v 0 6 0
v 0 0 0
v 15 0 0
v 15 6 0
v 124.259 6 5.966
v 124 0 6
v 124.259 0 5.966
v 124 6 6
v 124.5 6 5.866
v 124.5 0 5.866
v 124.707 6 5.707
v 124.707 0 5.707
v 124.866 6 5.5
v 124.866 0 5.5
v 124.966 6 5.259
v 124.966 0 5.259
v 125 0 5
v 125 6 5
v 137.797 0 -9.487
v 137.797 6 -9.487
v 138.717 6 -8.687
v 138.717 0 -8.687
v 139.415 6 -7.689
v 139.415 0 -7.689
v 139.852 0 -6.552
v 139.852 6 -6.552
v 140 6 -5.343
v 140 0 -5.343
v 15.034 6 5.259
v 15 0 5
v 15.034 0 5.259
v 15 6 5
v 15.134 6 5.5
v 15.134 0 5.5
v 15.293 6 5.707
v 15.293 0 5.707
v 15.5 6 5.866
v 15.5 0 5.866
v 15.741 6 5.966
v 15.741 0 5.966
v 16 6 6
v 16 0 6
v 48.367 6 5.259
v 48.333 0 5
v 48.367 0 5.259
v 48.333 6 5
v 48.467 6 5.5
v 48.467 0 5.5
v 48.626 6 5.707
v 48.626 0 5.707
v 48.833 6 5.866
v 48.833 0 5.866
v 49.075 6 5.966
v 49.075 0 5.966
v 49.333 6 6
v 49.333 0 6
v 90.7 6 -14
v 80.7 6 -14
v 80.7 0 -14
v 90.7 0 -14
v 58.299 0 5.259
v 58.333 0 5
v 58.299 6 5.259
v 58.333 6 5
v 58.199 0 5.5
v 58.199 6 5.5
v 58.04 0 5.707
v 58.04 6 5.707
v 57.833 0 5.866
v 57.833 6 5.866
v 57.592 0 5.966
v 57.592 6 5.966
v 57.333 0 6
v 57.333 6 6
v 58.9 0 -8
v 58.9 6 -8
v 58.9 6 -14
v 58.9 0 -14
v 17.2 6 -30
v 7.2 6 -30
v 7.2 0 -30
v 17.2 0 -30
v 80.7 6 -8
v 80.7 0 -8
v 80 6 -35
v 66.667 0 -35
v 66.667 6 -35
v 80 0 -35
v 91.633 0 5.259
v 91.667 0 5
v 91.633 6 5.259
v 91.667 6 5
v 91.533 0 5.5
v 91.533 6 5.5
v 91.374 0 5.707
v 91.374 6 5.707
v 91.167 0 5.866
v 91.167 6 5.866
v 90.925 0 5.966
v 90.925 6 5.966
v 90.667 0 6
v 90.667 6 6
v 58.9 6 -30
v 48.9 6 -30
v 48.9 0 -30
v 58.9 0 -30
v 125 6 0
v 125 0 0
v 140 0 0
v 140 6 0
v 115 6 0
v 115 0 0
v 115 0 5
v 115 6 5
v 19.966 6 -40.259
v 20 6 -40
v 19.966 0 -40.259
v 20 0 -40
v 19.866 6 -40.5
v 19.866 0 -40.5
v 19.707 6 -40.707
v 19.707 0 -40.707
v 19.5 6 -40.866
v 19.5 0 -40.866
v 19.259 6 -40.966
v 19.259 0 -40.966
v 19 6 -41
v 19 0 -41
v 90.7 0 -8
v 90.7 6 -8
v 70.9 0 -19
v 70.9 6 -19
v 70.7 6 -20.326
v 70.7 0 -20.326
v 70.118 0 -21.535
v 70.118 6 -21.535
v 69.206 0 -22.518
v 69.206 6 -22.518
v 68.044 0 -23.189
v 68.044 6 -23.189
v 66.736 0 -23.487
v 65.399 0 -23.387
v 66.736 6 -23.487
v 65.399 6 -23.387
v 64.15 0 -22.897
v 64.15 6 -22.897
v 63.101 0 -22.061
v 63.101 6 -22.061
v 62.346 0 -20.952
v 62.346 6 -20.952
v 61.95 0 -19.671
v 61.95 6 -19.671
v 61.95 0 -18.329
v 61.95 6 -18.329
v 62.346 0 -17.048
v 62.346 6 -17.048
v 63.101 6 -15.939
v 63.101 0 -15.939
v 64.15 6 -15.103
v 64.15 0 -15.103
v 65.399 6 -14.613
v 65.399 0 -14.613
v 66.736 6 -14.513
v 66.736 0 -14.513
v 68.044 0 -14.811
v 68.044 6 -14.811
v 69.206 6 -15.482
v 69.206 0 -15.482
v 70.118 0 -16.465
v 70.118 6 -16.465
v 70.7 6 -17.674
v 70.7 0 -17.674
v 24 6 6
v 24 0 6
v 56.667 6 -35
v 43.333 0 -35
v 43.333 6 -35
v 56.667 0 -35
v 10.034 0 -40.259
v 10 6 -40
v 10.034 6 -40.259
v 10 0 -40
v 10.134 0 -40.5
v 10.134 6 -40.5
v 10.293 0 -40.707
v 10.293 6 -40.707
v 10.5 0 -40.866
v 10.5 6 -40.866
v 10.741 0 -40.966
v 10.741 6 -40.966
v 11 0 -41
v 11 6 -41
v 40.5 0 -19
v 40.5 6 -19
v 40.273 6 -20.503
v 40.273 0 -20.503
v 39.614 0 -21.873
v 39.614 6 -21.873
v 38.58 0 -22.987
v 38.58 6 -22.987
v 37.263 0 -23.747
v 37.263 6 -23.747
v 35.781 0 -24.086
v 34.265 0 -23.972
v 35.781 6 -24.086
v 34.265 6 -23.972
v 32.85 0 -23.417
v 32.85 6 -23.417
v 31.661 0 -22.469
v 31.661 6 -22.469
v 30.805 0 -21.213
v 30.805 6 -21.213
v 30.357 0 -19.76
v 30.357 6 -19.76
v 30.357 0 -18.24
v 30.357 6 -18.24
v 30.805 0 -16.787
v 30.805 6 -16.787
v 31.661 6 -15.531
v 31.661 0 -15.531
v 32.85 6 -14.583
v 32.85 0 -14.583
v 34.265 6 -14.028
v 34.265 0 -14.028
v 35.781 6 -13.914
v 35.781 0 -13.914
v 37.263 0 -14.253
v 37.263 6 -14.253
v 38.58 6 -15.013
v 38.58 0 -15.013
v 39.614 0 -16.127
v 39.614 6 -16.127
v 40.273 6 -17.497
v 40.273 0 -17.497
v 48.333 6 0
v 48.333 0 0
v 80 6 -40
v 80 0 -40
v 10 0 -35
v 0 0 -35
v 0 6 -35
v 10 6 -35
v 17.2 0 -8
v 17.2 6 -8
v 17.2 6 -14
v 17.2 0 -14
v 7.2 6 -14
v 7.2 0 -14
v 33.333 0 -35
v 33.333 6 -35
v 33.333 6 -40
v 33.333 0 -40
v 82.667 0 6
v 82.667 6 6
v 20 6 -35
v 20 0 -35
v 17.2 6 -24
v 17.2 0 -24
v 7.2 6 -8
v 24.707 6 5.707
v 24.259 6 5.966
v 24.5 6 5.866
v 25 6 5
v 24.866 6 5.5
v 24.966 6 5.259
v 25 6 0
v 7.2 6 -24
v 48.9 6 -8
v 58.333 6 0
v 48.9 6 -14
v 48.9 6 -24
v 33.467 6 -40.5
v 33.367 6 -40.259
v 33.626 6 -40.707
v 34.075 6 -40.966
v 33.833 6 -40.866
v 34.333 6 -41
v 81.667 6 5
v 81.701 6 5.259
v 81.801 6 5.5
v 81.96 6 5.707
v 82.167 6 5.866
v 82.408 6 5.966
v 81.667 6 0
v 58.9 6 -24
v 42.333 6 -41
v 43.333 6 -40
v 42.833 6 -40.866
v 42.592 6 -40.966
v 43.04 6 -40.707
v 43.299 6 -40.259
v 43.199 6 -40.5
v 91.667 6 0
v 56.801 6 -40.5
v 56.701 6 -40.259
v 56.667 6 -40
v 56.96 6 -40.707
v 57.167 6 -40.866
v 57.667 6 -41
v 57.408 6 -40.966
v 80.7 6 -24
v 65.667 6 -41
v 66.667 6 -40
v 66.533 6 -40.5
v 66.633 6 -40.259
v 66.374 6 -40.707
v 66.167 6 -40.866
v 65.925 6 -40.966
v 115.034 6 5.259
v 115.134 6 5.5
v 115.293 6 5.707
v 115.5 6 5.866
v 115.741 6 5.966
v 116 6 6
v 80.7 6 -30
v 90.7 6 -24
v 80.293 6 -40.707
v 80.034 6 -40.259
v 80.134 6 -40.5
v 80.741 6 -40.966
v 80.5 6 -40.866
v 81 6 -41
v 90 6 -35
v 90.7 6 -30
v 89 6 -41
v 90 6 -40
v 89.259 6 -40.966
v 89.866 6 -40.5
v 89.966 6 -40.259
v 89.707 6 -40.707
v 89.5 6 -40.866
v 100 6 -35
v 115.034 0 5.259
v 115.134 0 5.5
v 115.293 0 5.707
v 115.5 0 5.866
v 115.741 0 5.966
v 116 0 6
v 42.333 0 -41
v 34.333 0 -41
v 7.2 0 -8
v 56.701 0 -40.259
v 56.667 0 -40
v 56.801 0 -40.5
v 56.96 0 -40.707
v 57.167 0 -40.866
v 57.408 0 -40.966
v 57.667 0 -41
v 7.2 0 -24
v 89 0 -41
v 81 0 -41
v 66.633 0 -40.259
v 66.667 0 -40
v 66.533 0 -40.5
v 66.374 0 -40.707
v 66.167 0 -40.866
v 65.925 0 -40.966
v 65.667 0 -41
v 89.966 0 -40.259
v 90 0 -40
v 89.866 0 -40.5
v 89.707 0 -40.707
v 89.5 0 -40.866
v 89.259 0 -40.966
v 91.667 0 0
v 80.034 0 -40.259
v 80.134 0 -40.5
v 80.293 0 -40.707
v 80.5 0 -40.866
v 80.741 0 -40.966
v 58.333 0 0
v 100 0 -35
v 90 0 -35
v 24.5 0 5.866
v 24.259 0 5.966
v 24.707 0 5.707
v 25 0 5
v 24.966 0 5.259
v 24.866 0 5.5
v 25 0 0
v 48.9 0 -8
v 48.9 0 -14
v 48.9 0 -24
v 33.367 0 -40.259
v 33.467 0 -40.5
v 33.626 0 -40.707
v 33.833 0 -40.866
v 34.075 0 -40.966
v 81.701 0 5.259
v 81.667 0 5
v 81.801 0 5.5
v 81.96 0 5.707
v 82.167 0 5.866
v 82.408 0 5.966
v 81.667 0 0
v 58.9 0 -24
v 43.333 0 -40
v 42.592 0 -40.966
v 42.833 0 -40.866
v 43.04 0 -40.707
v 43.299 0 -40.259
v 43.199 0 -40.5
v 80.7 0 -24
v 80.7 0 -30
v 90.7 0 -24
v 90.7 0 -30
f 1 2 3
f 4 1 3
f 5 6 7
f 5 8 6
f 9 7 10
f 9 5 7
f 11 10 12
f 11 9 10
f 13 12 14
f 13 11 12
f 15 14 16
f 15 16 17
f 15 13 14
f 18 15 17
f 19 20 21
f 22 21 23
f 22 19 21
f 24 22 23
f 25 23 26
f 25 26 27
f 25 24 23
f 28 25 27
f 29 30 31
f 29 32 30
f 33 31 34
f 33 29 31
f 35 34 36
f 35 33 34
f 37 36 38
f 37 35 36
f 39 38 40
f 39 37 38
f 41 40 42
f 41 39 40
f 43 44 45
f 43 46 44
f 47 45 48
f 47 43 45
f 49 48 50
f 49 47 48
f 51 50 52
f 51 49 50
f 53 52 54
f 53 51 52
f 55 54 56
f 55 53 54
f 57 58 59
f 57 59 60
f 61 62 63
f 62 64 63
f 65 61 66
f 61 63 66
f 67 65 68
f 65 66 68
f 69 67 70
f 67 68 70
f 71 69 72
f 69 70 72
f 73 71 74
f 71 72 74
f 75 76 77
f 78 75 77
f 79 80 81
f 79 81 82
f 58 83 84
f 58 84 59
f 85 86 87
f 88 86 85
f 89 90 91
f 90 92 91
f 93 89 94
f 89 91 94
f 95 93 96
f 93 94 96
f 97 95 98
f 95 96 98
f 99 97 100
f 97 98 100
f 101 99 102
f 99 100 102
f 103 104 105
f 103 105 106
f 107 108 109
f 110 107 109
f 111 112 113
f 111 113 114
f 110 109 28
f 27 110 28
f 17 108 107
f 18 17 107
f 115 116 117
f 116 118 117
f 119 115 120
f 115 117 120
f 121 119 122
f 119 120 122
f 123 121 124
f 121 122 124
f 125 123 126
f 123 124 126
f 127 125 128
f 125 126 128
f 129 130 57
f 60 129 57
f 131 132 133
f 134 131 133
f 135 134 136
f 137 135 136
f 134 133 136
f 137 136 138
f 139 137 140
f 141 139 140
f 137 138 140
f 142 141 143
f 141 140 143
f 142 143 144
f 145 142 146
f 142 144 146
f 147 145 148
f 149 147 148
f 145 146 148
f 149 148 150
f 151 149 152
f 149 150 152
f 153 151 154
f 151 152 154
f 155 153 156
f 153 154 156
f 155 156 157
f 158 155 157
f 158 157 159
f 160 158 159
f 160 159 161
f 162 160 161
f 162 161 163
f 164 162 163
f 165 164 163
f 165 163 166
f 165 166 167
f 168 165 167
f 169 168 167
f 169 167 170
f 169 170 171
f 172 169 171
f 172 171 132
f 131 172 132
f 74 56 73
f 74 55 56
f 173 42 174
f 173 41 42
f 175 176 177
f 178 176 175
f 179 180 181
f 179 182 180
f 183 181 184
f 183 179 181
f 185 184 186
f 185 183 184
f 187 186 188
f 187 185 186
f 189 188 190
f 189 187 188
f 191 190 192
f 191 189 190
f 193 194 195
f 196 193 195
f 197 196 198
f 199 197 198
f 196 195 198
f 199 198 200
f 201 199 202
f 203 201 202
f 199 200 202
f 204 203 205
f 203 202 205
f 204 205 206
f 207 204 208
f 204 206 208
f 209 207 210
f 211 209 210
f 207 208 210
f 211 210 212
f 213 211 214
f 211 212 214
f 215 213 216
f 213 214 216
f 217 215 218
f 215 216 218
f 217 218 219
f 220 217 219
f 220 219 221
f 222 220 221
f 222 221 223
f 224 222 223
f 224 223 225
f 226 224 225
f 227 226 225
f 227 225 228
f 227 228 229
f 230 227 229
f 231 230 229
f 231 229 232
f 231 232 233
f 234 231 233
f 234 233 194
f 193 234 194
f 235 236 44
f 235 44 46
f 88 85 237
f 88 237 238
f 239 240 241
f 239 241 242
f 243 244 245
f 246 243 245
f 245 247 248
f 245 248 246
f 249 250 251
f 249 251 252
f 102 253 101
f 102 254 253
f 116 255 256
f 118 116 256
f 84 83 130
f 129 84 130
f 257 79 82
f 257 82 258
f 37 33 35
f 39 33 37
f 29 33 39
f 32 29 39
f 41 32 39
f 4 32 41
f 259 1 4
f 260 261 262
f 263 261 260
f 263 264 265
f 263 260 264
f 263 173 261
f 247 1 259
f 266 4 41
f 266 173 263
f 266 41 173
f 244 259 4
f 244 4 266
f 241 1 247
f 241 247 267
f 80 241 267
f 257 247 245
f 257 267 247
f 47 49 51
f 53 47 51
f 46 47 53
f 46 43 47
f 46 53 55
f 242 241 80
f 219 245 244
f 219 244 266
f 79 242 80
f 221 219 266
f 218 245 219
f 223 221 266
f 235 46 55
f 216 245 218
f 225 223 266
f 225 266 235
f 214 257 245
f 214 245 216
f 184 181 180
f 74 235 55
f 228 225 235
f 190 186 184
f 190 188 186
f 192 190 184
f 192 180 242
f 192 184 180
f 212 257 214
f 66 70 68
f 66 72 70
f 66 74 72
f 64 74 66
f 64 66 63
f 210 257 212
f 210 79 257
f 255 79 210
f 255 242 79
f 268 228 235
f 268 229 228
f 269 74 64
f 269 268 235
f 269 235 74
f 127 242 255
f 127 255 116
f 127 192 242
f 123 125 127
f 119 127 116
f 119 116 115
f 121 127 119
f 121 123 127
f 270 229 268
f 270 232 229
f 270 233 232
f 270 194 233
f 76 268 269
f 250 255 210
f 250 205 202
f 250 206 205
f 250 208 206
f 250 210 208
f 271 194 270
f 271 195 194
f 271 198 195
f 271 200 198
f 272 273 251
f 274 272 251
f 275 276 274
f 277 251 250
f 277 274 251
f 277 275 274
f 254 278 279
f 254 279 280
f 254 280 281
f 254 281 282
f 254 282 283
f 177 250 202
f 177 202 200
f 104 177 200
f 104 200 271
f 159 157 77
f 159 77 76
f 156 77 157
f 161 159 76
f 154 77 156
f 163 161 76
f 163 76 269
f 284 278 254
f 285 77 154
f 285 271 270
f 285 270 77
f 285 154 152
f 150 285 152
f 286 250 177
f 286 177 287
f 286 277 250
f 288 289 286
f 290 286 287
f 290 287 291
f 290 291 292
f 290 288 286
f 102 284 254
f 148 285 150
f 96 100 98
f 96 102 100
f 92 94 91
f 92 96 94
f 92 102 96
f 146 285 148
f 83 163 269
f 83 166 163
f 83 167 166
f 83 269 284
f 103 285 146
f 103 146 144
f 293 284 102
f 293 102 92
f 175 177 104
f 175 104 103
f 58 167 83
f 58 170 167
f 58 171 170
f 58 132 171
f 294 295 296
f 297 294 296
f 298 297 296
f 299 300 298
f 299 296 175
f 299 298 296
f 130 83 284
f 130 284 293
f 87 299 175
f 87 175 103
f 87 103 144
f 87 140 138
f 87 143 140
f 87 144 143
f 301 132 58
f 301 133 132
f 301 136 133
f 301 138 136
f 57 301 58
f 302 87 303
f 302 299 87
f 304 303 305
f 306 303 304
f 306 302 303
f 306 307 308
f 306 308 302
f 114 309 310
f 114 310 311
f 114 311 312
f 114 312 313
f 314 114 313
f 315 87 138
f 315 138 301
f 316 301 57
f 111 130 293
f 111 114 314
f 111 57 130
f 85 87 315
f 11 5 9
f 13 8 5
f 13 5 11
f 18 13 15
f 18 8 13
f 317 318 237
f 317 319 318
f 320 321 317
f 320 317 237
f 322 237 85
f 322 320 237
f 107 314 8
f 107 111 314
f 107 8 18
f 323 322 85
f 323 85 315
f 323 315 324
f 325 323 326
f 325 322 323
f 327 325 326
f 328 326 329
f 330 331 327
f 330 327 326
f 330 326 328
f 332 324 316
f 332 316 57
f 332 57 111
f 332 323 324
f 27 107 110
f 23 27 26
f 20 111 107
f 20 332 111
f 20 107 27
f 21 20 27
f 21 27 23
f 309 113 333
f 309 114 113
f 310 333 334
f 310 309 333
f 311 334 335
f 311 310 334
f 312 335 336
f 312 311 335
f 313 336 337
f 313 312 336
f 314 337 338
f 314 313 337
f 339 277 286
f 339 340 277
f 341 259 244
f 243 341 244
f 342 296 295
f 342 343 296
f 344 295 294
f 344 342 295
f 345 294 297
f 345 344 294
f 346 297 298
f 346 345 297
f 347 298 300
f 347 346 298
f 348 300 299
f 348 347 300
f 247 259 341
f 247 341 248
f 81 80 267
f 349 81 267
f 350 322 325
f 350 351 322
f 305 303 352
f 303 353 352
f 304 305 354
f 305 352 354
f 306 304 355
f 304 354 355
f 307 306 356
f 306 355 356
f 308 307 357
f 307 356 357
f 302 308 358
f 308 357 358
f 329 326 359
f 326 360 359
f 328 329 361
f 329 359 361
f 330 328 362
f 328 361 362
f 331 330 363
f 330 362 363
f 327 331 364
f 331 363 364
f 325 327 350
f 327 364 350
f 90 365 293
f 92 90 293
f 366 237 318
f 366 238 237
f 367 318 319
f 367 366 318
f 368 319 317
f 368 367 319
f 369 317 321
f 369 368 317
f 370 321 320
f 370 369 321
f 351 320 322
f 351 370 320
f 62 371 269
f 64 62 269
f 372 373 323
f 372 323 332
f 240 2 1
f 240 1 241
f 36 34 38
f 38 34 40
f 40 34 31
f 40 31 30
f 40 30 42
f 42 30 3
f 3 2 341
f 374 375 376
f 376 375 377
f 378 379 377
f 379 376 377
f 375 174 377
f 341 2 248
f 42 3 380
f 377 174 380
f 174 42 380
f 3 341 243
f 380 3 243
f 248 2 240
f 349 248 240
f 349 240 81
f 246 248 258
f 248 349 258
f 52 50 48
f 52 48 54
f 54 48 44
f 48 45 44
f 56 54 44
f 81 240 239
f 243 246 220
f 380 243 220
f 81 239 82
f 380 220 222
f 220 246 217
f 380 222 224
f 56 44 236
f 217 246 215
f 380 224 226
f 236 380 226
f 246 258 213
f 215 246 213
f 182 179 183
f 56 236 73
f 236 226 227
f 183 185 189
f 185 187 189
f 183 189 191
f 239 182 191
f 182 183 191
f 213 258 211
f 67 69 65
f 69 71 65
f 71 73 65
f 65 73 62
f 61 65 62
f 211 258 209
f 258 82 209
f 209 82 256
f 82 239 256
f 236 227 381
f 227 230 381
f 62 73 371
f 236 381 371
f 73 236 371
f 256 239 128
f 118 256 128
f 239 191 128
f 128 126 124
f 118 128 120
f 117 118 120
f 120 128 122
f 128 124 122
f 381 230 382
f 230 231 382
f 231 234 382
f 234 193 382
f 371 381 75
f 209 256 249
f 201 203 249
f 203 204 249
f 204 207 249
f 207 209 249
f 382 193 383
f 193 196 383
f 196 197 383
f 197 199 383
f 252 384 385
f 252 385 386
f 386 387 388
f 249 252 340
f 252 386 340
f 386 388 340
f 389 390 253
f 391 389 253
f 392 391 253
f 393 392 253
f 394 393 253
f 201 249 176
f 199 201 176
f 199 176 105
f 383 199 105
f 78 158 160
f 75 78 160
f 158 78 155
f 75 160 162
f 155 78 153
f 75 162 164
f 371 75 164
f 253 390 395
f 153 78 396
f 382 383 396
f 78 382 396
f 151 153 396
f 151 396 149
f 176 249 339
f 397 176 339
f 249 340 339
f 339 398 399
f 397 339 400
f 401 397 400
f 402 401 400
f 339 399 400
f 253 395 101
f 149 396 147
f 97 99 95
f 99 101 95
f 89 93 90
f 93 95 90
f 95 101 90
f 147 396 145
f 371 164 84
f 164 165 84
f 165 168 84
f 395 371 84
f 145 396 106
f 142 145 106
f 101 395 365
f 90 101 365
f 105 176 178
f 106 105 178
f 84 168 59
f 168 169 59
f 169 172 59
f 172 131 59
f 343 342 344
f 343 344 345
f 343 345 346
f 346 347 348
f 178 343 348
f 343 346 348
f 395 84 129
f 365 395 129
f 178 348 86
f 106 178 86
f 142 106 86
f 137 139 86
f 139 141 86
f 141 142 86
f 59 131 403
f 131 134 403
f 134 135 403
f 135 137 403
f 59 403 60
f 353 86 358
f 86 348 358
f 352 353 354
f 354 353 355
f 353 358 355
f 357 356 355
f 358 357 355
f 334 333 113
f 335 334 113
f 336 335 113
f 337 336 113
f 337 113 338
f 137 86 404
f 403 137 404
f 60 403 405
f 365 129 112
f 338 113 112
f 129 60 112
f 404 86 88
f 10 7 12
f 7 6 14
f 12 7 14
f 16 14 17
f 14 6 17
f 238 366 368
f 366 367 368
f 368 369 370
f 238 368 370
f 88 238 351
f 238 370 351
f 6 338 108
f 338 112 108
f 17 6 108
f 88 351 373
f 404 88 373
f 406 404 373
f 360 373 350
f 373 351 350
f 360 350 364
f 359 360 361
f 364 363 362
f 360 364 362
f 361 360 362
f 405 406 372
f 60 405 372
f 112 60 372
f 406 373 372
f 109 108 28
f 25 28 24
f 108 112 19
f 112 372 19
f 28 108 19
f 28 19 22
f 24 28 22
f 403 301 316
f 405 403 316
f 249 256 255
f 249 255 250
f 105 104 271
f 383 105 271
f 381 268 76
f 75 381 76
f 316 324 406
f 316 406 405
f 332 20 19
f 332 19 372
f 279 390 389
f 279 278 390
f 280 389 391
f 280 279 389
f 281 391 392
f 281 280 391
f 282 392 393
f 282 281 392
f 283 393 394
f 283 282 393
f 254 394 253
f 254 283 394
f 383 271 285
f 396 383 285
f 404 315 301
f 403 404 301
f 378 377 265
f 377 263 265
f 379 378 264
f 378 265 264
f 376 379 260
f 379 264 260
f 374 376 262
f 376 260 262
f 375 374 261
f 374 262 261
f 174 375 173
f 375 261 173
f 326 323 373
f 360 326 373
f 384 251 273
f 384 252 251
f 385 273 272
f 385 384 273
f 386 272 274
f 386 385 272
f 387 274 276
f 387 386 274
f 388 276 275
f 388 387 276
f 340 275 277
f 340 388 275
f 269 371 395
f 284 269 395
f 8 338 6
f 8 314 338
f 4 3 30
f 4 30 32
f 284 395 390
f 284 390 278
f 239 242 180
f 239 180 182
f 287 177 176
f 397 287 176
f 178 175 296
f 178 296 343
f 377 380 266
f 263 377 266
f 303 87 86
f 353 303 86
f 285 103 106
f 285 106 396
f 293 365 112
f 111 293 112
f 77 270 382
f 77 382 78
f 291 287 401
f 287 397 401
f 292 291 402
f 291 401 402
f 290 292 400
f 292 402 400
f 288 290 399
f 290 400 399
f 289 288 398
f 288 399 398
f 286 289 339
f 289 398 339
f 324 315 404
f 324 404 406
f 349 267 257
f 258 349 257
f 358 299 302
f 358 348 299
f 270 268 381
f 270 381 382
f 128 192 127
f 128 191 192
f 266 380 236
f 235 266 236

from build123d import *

# Parameters (mm, degrees)
SKETCH1_W              = 140
SKETCH1_H              = 35
BOSS_EXTRUDE1_DEPTH    = 6
SKETCH2_R              = 4.5
SKETCH2_R_2            = 5.1
CUT_EXTRUDE1_DEPTH     = 7
CUT_EXTRUDE2_DEPTH     = 7
SKETCH234_W            = 10
SKETCH234_H            = 6
BOSS_EXTRUDE234_DEPTH  = 6
FILLET134_R            = 1
SKETCH2341_W           = 10
SKETCH2341_H           = 6
BOSS_EXTRUDE2341_DEPTH = 6
FILLET1341_R           = 1
SKETCH2342_W           = 10
SKETCH2342_H           = 6
BOSS_EXTRUDE2342_DEPTH = 6
FILLET1342_R           = 1
SKETCH2343_W           = 10
SKETCH2343_H           = 6
BOSS_EXTRUDE2343_DEPTH = 6
FILLET1343_R           = 1
SKETCH2344_W           = 10
SKETCH2344_H           = 6
BOSS_EXTRUDE2344_DEPTH = 6
FILLET1344_R           = 1
SKETCH2345_W           = 10
SKETCH2345_H           = 6
BOSS_EXTRUDE2345_DEPTH = 6
FILLET1345_R           = 1
SKETCH2346_W           = 10
SKETCH2346_H           = 6
BOSS_EXTRUDE2346_DEPTH = 6
FILLET1346_R           = 1
SKETCH2347_W           = 10
SKETCH2347_H           = 6
BOSS_EXTRUDE2347_DEPTH = 6
FILLET1347_R           = 1
SKETCH6_W              = 10
SKETCH6_H              = 6
CUT_EXTRUDE11_DEPTH    = 4
SKETCH61_W             = 10
SKETCH61_H             = 6
CUT_EXTRUDE12_DEPTH    = 4
SKETCH62_W             = 10
SKETCH62_H             = 6
CUT_EXTRUDE13_DEPTH    = 4
FILLET1348_R           = 5


with BuildPart() as part:
    # Sketch1 → Boss-Extrude1 (new body)
    with BuildSketch(Plane(origin=(0, 0, 0), x_dir=(1, 0, 0), z_dir=(0, 1, 0))):
        with Locations((70, 17.5)):
            Rectangle(SKETCH1_W, SKETCH1_H)
    extrude(amount=BOSS_EXTRUDE1_DEPTH)

    # Sketch2 → Cut-Extrude1 (cut, through all)
    with BuildSketch(Plane(origin=(0, 6, 0), x_dir=(1, 0, 0), z_dir=(0, 1, 0))):
        with Locations((66.4, 19)):
            Circle(SKETCH2_R)
        with Locations((35.4, 19)):
            Circle(SKETCH2_R_2)
    extrude(amount=-CUT_EXTRUDE1_DEPTH, mode=Mode.SUBTRACT)

    # Sketch3 → Cut-Extrude2 (cut, through all)
    with BuildSketch(Plane(origin=(0, 6, 0), x_dir=(1, 0, 0), z_dir=(0, 1, 0))):
        Polygon((140, 8), (100, 35), (140, 35), align=None)
    extrude(amount=-CUT_EXTRUDE2_DEPTH, mode=Mode.SUBTRACT)

    # Sketch234 → Boss-Extrude234 (add)
    with BuildSketch(Plane(origin=(119.232221392, 0, 0), x_dir=(1, 0, 0), z_dir=(0, 0, 1))):
        with Locations((0.767778608, 3)):
            Rectangle(SKETCH234_W, SKETCH234_H)
    extrude(amount=BOSS_EXTRUDE234_DEPTH)

    # Fillet134
    fillet134_edges = [part.edges().sort_by_distance(p)[0] for p in [
        (115, 3, 6),
        (125, 3, 6),
    ]]
    fillet(fillet134_edges, radius=FILLET134_R)

    # Sketch2341 → Boss-Extrude2341 (add)
    with BuildSketch(Plane(origin=(85.898888059, 0, 0), x_dir=(1, 0, 0), z_dir=(0, 0, 1))):
        with Locations((0.767778608, 3)):
            Rectangle(SKETCH2341_W, SKETCH2341_H)
    extrude(amount=BOSS_EXTRUDE2341_DEPTH)

    # Fillet1341
    fillet1341_edges = [part.edges().sort_by_distance(p)[0] for p in [
        (91.666666667, 3, 6),
        (81.666666667, 3, 6),
    ]]
    fillet(fillet1341_edges, radius=FILLET1341_R)

    # Sketch2342 → Boss-Extrude2342 (add)
    with BuildSketch(Plane(origin=(52.565554726, 0, 0), x_dir=(1, 0, 0), z_dir=(0, 0, 1))):
        with Locations((0.767778608, 3)):
            Rectangle(SKETCH2342_W, SKETCH2342_H)
    extrude(amount=BOSS_EXTRUDE2342_DEPTH)

    # Fillet1342
    fillet1342_edges = [part.edges().sort_by_distance(p)[0] for p in [
        (58.333333333, 3, 6),
        (48.333333333, 3, 6),
    ]]
    fillet(fillet1342_edges, radius=FILLET1342_R)

    # Sketch2343 → Boss-Extrude2343 (add)
    with BuildSketch(Plane(origin=(19.232221392, 0, 0), x_dir=(1, 0, 0), z_dir=(0, 0, 1))):
        with Locations((0.767778608, 3)):
            Rectangle(SKETCH2343_W, SKETCH2343_H)
    extrude(amount=BOSS_EXTRUDE2343_DEPTH)

    # Fillet1343
    fillet1343_edges = [part.edges().sort_by_distance(p)[0] for p in [
        (25, 3, 6),
        (15, 3, 6),
    ]]
    fillet(fillet1343_edges, radius=FILLET1343_R)

    # Sketch2344 → Boss-Extrude2344 (add)
    with BuildSketch(Plane(origin=(84.232221392, 6, -35), x_dir=(1, 0, 0), z_dir=(0, 0, -1))):
        with Locations((0.767778608, 3)):
            Rectangle(SKETCH2344_W, SKETCH2344_H)
    extrude(amount=BOSS_EXTRUDE2344_DEPTH)

    # Fillet1344
    fillet1344_edges = [part.edges().sort_by_distance(p)[0] for p in [
        (80, 3, -41),
        (90, 3, -41),
    ]]
    fillet(fillet1344_edges, radius=FILLET1344_R)

    # Sketch2345 → Boss-Extrude2345 (add)
    with BuildSketch(Plane(origin=(60.898888059, 6, -35), x_dir=(1, 0, 0), z_dir=(0, 0, -1))):
        with Locations((0.767778608, 3)):
            Rectangle(SKETCH2345_W, SKETCH2345_H)
    extrude(amount=BOSS_EXTRUDE2345_DEPTH)

    # Fillet1345
    fillet1345_edges = [part.edges().sort_by_distance(p)[0] for p in [
        (66.666666667, 3, -41),
        (56.666666667, 3, -41),
    ]]
    fillet(fillet1345_edges, radius=FILLET1345_R)

    # Sketch2346 → Boss-Extrude2346 (add)
    with BuildSketch(Plane(origin=(37.565554726, 6, -35), x_dir=(1, 0, 0), z_dir=(0, 0, -1))):
        with Locations((0.767778608, 3)):
            Rectangle(SKETCH2346_W, SKETCH2346_H)
    extrude(amount=BOSS_EXTRUDE2346_DEPTH)

    # Fillet1346
    fillet1346_edges = [part.edges().sort_by_distance(p)[0] for p in [
        (43.333333333, 3, -41),
        (33.333333333, 3, -41),
    ]]
    fillet(fillet1346_edges, radius=FILLET1346_R)

    # Sketch2347 → Boss-Extrude2347 (add)
    with BuildSketch(Plane(origin=(14.232221392, 6, -35), x_dir=(1, 0, 0), z_dir=(0, 0, -1))):
        with Locations((0.767778608, 3)):
            Rectangle(SKETCH2347_W, SKETCH2347_H)
    extrude(amount=BOSS_EXTRUDE2347_DEPTH)

    # Fillet1347
    fillet1347_edges = [part.edges().sort_by_distance(p)[0] for p in [
        (20, 3, -41),
        (10, 3, -41),
    ]]
    fillet(fillet1347_edges, radius=FILLET1347_R)

    # Sketch6 → Cut-Extrude11 (cut, symmetric)
    with BuildSketch(Plane(origin=(84.932221392, 3, -55), x_dir=(1, 0, 0), z_dir=(0, 1, 0))):
        with Locations((0.767778608, -44)):
            Rectangle(SKETCH6_W, SKETCH6_H)
    cut_extrude11 = extrude(amount=CUT_EXTRUDE11_DEPTH, both=True, mode=Mode.SUBTRACT)

    # Sketch61 → Cut-Extrude12 (cut, symmetric)
    with BuildSketch(Plane(origin=(53.132221392, 3, -55), x_dir=(1, 0, 0), z_dir=(0, 1, 0))):
        with Locations((0.767778608, -44)):
            Rectangle(SKETCH61_W, SKETCH61_H)
    cut_extrude12 = extrude(amount=CUT_EXTRUDE12_DEPTH, both=True, mode=Mode.SUBTRACT)

    # Sketch62 → Cut-Extrude13 (cut, symmetric)
    with BuildSketch(Plane(origin=(11.432221392, 3, -55), x_dir=(1, 0, 0), z_dir=(0, 1, 0))):
        with Locations((0.767778608, -44)):
            Rectangle(SKETCH62_W, SKETCH62_H)
    cut_extrude13 = extrude(amount=CUT_EXTRUDE13_DEPTH, both=True, mode=Mode.SUBTRACT)

    # Mirror1: Cut-Extrude11, Cut-Extrude12, Cut-Extrude13 across plane
    add(cut_extrude11.mirror(Plane.XY.offset(-19)), mode=Mode.SUBTRACT)
    add(cut_extrude12.mirror(Plane.XY.offset(-19)), mode=Mode.SUBTRACT)
    add(cut_extrude13.mirror(Plane.XY.offset(-19)), mode=Mode.SUBTRACT)

    # Fillet1348
    fillet1348_edges = [part.edges().sort_by_distance(p)[0] for p in [
        (140, 3, -8),
    ]]
    fillet(fillet1348_edges, radius=FILLET1348_R)


solid = part.part
